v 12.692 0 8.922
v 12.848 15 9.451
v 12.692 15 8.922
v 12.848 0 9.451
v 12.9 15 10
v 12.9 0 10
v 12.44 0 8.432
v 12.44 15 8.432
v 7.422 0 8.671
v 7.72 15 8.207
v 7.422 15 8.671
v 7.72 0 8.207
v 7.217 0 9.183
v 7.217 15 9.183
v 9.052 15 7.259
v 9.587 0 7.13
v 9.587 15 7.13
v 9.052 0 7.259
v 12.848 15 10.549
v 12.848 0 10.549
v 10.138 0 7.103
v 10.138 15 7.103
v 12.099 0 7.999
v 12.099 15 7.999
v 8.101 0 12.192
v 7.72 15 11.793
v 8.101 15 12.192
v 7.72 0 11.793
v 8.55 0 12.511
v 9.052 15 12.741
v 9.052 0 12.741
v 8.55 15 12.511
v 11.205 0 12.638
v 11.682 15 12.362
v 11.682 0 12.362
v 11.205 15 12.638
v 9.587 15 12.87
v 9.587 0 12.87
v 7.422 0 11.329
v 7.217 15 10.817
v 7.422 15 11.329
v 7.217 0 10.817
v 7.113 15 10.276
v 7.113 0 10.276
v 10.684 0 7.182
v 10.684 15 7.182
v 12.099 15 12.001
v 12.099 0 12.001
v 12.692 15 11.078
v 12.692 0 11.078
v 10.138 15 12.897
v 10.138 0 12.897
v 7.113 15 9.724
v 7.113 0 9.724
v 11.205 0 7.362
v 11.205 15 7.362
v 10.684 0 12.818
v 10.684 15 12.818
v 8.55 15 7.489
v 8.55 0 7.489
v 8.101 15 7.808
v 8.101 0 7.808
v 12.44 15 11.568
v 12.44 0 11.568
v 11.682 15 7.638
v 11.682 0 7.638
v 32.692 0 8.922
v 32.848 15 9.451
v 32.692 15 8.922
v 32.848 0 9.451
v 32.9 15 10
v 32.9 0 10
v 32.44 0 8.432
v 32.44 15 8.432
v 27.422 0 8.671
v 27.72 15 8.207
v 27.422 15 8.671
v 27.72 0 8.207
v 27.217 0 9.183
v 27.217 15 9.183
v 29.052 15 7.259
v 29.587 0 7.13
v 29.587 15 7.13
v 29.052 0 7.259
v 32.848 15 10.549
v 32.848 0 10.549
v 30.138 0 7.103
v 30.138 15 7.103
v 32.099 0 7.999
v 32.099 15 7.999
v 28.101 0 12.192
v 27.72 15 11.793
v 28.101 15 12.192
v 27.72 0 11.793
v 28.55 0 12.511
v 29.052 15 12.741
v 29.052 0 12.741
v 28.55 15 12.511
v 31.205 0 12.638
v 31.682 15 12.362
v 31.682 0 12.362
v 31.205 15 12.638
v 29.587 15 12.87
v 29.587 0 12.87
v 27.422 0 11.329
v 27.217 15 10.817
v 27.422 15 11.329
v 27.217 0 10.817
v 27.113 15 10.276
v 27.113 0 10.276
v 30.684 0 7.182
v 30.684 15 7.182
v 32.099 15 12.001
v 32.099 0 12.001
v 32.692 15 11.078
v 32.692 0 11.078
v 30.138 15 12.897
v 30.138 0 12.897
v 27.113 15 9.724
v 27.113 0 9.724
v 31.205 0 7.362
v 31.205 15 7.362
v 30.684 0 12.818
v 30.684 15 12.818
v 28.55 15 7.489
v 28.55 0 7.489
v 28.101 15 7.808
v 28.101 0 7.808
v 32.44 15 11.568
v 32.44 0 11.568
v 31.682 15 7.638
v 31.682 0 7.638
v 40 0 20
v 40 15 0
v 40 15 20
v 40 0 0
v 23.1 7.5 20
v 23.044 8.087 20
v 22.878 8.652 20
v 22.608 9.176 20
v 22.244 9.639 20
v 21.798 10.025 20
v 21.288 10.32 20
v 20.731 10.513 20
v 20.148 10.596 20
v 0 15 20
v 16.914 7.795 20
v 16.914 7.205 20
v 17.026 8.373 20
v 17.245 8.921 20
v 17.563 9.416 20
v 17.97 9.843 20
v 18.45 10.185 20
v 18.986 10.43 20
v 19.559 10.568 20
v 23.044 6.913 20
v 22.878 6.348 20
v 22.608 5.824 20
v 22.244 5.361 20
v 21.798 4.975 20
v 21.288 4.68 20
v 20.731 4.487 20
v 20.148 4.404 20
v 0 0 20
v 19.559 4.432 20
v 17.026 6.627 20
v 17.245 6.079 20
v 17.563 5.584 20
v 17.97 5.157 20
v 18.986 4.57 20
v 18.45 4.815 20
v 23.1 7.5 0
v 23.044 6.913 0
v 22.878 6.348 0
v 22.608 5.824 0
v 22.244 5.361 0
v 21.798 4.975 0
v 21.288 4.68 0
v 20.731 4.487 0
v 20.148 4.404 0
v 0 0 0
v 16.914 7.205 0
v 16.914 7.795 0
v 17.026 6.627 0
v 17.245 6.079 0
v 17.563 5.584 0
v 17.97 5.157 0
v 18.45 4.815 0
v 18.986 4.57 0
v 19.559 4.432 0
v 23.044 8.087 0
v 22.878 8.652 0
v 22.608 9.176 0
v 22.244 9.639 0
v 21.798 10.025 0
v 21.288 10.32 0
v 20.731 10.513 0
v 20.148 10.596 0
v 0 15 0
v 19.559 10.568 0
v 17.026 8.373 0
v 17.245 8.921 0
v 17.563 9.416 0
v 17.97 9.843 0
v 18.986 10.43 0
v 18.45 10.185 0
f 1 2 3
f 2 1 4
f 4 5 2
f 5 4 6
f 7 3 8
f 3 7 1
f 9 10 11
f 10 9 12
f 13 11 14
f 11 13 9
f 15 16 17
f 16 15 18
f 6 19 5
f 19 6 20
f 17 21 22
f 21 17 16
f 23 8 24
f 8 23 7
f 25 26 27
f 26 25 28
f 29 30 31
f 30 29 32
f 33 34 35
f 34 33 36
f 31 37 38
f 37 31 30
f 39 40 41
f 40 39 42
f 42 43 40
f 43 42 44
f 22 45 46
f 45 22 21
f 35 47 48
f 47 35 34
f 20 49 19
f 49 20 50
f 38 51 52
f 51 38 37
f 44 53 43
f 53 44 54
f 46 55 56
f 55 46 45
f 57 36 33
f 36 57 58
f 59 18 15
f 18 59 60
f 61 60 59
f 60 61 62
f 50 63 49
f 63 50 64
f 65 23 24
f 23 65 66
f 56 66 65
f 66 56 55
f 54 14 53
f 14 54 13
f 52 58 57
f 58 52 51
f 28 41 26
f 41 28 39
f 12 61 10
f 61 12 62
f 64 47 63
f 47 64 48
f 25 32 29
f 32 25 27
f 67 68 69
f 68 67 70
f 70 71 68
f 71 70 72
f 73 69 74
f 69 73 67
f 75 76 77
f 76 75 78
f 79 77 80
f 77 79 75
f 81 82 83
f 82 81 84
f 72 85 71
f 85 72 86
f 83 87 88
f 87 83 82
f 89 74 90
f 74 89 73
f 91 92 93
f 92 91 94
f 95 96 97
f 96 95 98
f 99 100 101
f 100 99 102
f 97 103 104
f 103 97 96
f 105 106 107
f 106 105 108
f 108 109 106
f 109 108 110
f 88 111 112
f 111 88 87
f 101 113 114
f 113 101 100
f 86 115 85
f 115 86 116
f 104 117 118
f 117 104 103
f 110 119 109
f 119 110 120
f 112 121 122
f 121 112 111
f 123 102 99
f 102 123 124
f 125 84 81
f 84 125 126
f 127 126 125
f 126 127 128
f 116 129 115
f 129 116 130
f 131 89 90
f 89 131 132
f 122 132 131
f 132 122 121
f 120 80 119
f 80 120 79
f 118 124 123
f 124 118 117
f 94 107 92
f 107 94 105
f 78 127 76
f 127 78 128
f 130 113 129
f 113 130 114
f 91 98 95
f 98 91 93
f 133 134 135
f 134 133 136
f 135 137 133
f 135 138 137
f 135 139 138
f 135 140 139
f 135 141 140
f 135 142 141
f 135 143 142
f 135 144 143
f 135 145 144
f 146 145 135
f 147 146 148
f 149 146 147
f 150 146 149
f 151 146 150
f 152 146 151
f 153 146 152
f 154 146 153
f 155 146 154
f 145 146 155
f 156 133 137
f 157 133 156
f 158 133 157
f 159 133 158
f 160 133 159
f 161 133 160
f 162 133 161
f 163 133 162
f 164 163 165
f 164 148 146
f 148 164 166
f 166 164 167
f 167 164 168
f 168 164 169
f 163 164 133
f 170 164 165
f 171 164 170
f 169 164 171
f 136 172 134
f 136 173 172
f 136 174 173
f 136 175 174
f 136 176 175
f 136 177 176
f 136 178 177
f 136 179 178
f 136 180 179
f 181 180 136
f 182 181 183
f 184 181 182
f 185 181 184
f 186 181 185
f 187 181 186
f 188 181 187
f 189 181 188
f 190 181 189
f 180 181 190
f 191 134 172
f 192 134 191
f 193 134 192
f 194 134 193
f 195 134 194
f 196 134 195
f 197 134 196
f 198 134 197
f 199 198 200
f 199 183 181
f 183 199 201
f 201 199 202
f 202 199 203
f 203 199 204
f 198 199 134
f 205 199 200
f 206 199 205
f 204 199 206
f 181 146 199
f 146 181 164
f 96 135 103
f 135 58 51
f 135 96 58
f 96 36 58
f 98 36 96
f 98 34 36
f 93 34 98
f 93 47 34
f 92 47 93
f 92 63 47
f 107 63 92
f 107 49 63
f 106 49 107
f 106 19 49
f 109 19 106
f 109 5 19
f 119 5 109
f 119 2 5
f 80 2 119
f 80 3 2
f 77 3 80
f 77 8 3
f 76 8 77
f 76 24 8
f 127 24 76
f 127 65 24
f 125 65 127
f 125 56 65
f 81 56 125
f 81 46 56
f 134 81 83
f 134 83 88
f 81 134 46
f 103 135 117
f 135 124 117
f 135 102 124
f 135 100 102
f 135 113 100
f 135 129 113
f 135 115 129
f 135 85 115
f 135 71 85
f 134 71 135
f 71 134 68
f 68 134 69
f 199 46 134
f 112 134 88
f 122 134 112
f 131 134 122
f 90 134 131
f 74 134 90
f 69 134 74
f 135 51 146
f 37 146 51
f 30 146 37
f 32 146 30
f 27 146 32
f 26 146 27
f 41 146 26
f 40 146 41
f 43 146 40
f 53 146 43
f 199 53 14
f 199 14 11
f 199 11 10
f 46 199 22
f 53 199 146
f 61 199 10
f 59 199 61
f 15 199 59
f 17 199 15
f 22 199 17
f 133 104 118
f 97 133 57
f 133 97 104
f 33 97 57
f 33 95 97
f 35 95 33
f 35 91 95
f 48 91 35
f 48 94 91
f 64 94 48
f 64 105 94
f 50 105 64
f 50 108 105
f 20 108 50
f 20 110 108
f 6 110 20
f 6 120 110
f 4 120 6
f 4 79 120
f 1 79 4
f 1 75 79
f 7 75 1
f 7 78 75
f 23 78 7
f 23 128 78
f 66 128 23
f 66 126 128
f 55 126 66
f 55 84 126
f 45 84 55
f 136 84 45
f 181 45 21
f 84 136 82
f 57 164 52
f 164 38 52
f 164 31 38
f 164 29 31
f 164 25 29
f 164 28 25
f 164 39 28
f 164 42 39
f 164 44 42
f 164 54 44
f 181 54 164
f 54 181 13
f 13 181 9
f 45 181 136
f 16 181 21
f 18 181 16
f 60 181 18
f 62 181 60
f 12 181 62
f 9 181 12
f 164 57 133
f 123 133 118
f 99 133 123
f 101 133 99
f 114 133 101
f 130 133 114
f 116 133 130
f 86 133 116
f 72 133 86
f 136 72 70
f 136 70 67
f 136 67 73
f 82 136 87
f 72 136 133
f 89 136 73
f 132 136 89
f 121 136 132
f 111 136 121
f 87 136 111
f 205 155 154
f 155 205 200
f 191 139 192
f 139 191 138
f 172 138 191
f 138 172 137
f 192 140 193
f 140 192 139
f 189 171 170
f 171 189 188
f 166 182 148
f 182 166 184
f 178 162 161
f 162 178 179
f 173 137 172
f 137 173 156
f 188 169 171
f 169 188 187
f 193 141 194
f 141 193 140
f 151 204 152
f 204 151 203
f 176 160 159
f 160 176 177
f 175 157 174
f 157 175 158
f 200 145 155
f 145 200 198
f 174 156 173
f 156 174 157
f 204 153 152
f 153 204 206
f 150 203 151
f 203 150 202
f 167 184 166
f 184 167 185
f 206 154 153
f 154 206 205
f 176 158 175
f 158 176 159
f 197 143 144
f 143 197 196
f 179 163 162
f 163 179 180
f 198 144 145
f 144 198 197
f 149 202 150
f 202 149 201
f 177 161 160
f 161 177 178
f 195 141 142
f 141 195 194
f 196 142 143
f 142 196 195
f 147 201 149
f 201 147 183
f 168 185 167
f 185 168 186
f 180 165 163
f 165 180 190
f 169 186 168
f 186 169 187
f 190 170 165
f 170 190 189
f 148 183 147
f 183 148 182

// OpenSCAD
// Bracket for foot

difference() {
	cube([40, 15, 20]);
	translate([20, 7.5, -0.1]) cylinder(r=3+0.1, h=40.2, $fn=33);
	for(i = [10, 30]) {
		for(j = [10, 30]) {
			translate([i, -0.1, j]) rotate([-90, 0, 0]) cylinder(r=2.5+0.4, h=20.2, $fn=33);
		}
	}
}
